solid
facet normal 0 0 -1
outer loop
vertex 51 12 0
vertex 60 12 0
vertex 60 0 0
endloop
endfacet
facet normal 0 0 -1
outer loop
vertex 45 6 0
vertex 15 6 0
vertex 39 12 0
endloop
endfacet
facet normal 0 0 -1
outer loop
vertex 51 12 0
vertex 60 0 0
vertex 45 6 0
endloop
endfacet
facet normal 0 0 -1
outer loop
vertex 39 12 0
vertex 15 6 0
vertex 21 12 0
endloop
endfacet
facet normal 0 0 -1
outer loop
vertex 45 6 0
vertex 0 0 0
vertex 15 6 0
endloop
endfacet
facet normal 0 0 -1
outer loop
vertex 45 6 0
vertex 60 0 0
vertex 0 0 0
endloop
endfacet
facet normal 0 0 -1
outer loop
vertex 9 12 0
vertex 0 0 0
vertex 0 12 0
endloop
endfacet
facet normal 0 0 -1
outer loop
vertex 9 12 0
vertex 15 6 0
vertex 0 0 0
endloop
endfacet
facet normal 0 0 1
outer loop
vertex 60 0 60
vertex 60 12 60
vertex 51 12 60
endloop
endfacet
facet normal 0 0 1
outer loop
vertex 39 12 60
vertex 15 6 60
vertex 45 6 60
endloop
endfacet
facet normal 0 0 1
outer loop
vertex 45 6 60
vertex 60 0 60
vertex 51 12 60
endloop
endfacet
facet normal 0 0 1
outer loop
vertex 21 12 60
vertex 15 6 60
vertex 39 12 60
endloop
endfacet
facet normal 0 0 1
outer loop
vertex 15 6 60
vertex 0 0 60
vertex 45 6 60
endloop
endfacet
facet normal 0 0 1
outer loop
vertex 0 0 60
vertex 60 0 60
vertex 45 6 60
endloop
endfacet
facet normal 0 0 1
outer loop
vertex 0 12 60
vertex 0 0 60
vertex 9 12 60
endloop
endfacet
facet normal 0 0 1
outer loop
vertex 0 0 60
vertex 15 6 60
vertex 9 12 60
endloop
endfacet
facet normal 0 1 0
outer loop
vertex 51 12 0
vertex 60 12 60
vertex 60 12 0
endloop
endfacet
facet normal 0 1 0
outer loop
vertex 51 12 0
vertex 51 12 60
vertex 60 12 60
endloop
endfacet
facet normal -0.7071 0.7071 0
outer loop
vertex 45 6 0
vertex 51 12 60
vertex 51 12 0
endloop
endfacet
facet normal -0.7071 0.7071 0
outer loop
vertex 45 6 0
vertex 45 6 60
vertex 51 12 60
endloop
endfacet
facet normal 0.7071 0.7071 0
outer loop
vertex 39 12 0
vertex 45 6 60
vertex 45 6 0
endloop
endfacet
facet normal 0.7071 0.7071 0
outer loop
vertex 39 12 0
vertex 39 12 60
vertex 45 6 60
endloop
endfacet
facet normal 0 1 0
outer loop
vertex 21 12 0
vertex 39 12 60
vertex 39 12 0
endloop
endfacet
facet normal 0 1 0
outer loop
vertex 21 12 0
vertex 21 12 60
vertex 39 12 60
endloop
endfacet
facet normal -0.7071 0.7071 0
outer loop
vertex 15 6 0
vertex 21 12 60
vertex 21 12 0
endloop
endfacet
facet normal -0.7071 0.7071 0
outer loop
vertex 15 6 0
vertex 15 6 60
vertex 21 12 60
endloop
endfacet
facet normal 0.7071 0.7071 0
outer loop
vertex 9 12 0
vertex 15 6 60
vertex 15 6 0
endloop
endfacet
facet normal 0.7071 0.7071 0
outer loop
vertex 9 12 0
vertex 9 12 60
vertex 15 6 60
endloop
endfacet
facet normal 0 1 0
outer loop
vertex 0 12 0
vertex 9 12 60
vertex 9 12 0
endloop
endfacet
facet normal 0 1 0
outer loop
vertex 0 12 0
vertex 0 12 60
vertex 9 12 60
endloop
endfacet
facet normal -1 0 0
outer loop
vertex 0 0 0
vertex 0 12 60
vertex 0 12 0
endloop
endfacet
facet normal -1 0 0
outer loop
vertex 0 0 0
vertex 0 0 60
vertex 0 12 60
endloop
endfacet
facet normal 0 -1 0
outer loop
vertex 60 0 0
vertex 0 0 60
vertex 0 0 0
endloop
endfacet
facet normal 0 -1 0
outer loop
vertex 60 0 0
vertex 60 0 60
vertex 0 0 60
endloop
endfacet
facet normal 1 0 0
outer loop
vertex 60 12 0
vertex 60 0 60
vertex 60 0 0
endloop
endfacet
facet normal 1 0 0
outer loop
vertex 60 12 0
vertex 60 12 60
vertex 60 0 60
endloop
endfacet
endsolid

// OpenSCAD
$fn = 32;

// ----------------------------------------------------------------------
// V guide rail: doublev, 60 mm wide
// ----------------------------------------------------------------------

// --- parameters (mm) ---
rail_w = 60;              // rail width, X
base_t = 12;              // base plate thickness
v_depth = 6;              // V feature depth / height
v_half_w = 12;            // half width of the V at the base face
plate_t = 60;             // rail length, Z (the extrusion height)
groove_off = 15;          // offset of each groove from the centreline

centre_x = rail_w / 2;  // rail centreline
groove_a = centre_x - groove_off;  // axis of the first groove
groove_b = centre_x + groove_off;  // axis of the second groove

profile = [[0, 0], [60, 0], [60, 12], [51, 12], [45, 6], [39, 12], [21, 12], [15, 6], [9, 12], [0, 12]];  // primary outline, 10 points, counter clockwise

// --- the one profile operation ---
linear_extrude(height = plate_t) polygon(points = profile);
